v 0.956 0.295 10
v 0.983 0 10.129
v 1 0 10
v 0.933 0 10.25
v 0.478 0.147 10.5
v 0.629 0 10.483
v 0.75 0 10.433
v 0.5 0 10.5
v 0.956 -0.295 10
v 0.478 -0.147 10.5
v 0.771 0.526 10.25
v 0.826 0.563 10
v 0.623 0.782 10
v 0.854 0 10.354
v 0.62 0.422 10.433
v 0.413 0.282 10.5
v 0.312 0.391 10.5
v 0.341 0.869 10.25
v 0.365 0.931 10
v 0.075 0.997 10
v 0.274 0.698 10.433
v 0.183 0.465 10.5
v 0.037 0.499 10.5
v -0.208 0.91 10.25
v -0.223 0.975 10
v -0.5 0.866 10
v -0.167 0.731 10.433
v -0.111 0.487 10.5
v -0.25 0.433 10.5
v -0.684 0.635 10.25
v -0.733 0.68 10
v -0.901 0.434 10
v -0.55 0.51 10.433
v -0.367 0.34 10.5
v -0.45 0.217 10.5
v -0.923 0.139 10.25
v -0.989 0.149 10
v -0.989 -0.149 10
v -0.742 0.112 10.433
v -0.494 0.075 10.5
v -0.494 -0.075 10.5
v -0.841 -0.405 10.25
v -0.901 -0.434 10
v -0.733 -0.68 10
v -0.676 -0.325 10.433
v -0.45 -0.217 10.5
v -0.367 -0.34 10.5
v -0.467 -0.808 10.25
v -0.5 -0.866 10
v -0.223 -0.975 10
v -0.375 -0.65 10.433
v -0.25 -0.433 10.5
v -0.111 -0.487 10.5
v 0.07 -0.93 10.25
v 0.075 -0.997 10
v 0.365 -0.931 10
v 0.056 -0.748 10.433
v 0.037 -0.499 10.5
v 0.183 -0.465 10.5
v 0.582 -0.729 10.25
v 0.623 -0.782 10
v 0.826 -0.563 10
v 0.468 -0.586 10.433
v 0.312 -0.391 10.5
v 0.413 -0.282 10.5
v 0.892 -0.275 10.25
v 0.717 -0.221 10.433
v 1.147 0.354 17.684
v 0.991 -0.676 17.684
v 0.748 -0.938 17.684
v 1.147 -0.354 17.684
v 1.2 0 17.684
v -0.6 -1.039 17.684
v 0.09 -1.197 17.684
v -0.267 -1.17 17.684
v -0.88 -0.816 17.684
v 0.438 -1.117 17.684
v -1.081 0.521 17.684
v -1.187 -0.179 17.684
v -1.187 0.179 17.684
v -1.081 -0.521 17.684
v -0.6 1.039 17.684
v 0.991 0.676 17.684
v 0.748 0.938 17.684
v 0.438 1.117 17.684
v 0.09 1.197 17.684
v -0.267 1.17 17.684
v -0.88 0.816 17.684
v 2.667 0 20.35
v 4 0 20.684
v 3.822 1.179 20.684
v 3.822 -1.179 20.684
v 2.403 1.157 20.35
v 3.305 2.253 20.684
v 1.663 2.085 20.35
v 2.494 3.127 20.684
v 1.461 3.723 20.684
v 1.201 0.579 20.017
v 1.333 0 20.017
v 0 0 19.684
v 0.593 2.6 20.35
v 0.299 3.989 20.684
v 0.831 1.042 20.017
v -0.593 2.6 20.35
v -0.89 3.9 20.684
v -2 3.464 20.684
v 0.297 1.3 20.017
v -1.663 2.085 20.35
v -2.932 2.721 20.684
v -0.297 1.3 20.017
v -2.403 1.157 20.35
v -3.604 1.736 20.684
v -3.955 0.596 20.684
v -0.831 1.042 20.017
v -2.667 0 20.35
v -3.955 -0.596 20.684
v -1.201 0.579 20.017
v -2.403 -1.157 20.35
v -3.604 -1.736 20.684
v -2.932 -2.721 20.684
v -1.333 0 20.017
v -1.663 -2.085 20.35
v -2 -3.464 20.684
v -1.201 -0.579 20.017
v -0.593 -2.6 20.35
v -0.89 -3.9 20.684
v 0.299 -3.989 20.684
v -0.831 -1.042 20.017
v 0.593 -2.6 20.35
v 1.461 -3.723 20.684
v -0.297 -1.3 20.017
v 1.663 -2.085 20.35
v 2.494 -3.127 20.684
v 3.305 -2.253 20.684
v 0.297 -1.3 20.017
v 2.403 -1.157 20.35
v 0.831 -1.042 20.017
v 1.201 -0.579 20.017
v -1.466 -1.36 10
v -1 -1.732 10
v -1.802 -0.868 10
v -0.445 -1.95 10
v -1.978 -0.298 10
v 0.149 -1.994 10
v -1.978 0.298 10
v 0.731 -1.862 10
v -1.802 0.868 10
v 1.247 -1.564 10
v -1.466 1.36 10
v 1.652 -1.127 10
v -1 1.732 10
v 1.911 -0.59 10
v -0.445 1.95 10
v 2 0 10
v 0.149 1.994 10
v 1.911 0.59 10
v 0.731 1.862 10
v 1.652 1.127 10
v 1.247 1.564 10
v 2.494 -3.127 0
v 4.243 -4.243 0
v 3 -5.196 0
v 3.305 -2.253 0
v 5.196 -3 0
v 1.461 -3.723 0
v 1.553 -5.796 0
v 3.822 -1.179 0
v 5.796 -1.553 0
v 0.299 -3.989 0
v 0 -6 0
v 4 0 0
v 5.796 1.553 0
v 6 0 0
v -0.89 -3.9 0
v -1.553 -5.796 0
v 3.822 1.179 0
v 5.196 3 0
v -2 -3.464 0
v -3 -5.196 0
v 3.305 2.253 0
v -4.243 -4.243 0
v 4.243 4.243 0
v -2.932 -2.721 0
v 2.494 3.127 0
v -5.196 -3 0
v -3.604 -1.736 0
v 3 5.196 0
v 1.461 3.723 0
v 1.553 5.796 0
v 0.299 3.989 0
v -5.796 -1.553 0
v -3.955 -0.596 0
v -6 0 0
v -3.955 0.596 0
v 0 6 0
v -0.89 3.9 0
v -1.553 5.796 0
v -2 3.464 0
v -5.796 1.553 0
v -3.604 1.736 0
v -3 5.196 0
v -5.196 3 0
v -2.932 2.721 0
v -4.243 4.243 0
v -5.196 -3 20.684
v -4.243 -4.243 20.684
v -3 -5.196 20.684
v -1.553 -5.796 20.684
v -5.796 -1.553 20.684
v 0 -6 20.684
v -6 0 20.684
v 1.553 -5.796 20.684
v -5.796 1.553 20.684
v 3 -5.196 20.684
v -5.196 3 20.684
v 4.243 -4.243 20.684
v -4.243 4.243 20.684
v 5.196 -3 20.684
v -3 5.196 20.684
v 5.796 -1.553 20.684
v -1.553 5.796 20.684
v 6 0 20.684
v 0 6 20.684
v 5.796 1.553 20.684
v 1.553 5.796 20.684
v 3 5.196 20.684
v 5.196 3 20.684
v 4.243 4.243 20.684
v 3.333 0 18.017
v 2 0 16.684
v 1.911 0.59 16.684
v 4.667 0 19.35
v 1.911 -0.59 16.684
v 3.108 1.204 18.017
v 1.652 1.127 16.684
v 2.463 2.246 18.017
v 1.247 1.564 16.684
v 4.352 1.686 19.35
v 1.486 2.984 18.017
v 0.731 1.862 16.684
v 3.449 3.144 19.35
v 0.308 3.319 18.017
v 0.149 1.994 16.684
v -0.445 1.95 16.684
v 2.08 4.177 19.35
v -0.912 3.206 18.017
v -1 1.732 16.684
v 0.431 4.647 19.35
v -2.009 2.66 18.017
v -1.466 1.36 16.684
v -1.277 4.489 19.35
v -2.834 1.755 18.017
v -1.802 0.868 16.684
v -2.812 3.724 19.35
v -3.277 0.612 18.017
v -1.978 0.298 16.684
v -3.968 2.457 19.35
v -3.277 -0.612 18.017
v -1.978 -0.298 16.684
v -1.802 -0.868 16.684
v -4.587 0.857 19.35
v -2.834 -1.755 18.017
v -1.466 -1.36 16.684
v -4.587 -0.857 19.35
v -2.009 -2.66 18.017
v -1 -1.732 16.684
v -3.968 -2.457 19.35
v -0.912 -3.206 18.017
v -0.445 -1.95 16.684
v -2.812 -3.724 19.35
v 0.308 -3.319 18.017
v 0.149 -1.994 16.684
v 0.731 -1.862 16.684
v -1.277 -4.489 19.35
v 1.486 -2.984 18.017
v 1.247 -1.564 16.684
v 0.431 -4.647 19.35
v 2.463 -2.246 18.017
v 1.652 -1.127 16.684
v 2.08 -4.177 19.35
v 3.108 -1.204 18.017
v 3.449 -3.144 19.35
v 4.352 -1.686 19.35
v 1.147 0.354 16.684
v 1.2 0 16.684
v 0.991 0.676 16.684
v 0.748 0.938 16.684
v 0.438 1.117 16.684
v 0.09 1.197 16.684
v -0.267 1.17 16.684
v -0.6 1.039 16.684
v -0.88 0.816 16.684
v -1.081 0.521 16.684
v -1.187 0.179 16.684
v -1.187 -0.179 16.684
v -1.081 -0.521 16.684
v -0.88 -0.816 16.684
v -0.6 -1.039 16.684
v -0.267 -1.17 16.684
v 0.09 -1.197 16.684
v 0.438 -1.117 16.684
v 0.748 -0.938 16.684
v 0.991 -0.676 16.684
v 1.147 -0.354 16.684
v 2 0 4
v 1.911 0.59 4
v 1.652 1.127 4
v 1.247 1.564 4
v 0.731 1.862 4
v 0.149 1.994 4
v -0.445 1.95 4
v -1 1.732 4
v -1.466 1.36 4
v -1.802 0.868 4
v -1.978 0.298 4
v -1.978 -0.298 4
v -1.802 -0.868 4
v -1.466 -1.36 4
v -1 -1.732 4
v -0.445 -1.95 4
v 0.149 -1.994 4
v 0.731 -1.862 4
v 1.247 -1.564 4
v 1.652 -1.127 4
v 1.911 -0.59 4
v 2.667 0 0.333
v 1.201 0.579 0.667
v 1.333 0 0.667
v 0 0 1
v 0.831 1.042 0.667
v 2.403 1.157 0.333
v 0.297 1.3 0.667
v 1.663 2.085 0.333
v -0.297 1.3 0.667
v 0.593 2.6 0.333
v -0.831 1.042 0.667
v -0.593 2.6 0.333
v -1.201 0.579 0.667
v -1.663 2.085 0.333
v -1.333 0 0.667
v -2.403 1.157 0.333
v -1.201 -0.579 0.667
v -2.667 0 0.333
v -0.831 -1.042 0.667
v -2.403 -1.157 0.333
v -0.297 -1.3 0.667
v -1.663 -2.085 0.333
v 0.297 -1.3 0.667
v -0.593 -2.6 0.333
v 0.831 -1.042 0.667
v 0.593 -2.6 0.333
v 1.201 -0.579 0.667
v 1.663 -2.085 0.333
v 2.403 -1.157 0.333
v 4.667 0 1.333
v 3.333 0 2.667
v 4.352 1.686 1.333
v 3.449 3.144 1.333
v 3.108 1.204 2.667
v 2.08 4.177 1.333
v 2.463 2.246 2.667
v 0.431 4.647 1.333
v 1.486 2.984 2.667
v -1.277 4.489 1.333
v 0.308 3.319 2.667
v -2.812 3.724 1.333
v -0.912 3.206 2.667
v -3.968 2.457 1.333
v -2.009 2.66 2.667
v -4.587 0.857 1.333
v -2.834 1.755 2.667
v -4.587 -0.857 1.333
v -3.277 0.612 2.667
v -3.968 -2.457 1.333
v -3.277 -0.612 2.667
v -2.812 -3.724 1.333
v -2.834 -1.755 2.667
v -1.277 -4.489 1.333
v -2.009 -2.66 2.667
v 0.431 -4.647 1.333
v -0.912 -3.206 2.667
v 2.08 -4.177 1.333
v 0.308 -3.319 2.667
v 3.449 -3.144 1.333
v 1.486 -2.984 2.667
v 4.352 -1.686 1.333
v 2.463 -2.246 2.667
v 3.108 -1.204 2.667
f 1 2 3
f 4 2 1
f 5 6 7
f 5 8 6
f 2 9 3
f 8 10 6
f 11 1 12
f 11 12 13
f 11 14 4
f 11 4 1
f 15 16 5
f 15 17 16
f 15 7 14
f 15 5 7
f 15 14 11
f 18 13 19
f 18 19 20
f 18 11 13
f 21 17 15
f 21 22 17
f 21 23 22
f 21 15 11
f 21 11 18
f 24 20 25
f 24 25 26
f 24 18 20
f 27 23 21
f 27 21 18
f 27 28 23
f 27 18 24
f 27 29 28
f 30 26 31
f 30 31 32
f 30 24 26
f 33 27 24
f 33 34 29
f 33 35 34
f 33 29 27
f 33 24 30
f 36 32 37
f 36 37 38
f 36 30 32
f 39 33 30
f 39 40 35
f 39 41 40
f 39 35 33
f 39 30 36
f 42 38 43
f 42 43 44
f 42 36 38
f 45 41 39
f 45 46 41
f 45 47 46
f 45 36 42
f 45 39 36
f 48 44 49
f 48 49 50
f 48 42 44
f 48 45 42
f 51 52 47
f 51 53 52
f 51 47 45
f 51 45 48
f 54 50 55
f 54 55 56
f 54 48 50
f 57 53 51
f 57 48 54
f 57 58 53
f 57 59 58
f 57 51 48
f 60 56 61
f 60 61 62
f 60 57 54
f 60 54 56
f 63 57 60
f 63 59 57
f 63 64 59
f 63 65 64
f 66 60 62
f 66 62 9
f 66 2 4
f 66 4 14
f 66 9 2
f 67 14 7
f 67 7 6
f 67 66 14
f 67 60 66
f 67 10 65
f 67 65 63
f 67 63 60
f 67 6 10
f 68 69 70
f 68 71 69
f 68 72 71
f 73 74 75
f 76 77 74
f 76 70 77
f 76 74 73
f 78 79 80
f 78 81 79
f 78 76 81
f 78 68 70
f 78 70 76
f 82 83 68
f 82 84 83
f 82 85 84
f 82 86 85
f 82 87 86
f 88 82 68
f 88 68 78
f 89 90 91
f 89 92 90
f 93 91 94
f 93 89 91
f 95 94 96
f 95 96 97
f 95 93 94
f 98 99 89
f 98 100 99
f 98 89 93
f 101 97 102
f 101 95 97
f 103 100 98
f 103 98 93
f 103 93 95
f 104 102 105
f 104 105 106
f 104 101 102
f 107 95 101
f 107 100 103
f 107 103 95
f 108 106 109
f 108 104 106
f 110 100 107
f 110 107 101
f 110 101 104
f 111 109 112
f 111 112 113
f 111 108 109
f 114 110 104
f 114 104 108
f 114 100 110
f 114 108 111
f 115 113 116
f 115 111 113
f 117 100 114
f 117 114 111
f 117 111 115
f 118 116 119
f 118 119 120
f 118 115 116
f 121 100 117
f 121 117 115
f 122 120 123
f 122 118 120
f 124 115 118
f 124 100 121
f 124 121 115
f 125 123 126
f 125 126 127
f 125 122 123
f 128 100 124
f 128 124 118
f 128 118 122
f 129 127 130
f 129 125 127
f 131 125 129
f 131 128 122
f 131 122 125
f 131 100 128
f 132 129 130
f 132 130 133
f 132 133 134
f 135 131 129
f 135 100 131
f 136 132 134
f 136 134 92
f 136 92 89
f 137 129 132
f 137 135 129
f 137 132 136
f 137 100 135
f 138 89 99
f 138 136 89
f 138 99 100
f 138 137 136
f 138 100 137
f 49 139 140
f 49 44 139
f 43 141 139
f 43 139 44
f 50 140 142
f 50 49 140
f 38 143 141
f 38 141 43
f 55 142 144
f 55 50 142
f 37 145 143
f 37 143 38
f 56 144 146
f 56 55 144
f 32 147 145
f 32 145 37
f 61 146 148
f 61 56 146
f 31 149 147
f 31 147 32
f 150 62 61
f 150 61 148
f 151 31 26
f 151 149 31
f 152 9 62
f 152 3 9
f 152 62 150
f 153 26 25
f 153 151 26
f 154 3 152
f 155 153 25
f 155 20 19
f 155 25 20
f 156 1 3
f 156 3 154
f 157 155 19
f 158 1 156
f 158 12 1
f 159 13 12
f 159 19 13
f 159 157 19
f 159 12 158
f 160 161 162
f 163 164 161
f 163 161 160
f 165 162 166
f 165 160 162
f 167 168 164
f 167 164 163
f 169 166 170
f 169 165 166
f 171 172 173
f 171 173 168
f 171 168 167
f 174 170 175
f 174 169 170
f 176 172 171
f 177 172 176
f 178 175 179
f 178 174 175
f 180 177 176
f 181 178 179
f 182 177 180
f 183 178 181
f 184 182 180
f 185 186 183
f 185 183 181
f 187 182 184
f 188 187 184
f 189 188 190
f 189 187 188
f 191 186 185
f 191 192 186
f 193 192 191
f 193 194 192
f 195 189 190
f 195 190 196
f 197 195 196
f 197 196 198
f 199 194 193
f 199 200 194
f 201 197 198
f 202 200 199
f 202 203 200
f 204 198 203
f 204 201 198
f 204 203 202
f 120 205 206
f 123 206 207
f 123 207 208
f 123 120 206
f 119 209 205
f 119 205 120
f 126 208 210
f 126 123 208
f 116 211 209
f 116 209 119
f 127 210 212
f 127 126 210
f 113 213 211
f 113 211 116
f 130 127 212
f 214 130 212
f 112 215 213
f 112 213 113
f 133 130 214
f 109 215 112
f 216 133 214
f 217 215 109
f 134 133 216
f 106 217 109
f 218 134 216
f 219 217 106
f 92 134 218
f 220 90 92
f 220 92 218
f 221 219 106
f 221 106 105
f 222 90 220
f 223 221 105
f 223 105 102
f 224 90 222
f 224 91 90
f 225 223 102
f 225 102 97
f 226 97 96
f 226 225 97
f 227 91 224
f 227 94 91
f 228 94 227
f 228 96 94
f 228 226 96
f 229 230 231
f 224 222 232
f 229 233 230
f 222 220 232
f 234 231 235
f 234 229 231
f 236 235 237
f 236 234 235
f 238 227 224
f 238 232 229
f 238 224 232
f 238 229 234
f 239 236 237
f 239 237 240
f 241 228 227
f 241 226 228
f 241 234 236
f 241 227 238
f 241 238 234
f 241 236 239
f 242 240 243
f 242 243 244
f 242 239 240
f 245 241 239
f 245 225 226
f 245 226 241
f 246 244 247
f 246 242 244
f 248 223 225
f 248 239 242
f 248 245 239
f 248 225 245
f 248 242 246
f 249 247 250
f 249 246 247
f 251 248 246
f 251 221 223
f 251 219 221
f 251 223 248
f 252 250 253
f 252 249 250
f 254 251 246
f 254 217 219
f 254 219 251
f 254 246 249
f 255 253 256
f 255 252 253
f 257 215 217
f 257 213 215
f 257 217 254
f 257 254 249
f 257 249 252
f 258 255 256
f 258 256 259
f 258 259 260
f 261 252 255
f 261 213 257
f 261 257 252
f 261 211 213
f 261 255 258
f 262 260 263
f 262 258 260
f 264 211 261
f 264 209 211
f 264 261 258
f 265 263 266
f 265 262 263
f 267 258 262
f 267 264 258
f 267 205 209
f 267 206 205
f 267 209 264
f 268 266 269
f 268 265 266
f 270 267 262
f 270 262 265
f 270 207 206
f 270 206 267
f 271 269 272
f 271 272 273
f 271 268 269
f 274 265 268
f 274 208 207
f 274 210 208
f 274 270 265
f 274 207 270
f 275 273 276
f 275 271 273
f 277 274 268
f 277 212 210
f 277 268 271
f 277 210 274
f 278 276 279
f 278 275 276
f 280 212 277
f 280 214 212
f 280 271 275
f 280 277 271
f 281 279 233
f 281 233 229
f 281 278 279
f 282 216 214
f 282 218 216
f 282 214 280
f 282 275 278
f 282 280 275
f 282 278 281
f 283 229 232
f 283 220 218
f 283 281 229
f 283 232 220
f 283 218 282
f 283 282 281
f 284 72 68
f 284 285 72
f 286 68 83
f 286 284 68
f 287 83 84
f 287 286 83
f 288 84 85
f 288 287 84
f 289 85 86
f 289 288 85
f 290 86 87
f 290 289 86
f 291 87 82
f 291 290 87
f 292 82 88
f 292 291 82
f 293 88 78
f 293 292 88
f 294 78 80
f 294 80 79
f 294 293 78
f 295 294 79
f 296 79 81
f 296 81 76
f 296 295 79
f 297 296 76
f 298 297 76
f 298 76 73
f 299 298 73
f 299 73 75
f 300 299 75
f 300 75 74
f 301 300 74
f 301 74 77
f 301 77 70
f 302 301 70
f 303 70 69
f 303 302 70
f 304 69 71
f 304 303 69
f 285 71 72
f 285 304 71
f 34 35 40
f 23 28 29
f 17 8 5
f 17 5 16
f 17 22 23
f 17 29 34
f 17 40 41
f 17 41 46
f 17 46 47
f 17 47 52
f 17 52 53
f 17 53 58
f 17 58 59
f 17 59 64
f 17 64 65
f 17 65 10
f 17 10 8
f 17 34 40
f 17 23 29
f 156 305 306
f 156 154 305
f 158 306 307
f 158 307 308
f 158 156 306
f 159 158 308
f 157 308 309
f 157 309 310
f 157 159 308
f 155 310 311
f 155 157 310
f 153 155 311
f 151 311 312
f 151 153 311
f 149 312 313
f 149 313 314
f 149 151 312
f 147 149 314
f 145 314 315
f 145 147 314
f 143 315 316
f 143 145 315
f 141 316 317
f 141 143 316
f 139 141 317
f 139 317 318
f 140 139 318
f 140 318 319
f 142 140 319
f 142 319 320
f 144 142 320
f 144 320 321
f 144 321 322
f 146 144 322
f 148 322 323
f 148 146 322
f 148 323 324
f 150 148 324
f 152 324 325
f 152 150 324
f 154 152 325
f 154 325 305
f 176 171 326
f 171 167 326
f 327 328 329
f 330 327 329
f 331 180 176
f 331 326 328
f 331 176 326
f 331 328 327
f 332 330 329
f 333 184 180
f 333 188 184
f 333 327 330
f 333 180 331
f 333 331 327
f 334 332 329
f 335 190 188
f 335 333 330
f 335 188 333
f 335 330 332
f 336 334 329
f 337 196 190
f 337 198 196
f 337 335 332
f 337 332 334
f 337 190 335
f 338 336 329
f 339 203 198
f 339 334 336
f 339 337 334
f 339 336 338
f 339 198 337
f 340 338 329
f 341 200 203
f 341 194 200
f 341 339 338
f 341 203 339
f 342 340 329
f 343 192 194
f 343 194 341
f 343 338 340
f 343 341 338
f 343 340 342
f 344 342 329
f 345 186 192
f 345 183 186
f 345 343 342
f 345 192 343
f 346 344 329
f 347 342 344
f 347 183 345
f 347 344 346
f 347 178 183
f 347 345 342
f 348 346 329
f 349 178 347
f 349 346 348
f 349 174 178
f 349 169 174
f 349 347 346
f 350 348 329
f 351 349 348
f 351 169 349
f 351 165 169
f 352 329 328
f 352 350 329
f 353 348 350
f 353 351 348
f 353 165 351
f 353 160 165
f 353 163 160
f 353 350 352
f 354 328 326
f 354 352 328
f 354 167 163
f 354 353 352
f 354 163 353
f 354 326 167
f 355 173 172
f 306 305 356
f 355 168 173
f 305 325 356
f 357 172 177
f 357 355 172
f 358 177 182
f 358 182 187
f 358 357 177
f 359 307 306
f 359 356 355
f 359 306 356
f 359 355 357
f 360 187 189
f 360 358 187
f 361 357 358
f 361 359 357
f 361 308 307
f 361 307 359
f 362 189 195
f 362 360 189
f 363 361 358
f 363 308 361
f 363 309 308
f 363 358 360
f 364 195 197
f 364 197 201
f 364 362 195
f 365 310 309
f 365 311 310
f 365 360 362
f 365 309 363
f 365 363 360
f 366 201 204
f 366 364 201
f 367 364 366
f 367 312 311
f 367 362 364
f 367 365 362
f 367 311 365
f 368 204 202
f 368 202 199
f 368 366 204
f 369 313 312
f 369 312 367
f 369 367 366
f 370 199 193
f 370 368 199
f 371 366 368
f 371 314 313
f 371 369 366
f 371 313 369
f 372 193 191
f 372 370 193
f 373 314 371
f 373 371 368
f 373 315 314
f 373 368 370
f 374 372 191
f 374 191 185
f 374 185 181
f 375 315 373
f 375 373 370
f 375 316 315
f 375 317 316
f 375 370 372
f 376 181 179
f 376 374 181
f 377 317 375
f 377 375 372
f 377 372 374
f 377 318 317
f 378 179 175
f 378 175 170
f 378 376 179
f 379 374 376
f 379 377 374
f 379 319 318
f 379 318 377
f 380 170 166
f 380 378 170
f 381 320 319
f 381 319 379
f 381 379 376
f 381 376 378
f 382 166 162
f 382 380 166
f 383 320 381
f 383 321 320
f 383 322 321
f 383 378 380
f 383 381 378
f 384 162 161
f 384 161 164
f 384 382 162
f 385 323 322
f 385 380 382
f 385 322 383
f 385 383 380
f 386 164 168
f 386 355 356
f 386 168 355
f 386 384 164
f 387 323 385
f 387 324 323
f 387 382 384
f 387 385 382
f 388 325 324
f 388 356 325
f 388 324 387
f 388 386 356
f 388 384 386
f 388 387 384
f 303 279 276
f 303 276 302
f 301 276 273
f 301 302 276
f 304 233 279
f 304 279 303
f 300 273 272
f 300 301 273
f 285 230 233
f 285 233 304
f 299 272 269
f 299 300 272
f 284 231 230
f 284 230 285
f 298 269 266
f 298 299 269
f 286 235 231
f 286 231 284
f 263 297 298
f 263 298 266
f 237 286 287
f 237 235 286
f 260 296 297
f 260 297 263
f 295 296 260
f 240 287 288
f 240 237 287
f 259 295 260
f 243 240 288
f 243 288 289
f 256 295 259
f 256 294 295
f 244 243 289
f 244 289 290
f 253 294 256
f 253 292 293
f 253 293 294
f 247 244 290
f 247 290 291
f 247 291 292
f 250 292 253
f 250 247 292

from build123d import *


with BuildPart() as f1:
    # F0 (on Front) → F1 (revolve)
    with BuildSketch(Plane.XZ):
        with BuildLine():
            Line((0, 1), (4, 0))
            Line((4, 0), (6, 0))
            Line((6, 0), (2, 4))
            Line((2, 4), (2, 10))
            Line((2, 10), (1, 10))
            ThreePointArc((1, 10), (0.853553, 10.353553), (0.5, 10.5))
            Line((0.5, 10.5), (0, 10.5))
            Line((0, 10.5), (0, 1))
        make_face()
        Polygon((1.2, 17.683683), (1.2, 16.683683), (2, 16.683683), (6, 20.683683), (4, 20.683683), (0, 19.683683), (0, 17.683683), align=None)
    revolve(axis=Axis((0, 0, 10.341842), (0, 0, 1)))


solid = f1.part
